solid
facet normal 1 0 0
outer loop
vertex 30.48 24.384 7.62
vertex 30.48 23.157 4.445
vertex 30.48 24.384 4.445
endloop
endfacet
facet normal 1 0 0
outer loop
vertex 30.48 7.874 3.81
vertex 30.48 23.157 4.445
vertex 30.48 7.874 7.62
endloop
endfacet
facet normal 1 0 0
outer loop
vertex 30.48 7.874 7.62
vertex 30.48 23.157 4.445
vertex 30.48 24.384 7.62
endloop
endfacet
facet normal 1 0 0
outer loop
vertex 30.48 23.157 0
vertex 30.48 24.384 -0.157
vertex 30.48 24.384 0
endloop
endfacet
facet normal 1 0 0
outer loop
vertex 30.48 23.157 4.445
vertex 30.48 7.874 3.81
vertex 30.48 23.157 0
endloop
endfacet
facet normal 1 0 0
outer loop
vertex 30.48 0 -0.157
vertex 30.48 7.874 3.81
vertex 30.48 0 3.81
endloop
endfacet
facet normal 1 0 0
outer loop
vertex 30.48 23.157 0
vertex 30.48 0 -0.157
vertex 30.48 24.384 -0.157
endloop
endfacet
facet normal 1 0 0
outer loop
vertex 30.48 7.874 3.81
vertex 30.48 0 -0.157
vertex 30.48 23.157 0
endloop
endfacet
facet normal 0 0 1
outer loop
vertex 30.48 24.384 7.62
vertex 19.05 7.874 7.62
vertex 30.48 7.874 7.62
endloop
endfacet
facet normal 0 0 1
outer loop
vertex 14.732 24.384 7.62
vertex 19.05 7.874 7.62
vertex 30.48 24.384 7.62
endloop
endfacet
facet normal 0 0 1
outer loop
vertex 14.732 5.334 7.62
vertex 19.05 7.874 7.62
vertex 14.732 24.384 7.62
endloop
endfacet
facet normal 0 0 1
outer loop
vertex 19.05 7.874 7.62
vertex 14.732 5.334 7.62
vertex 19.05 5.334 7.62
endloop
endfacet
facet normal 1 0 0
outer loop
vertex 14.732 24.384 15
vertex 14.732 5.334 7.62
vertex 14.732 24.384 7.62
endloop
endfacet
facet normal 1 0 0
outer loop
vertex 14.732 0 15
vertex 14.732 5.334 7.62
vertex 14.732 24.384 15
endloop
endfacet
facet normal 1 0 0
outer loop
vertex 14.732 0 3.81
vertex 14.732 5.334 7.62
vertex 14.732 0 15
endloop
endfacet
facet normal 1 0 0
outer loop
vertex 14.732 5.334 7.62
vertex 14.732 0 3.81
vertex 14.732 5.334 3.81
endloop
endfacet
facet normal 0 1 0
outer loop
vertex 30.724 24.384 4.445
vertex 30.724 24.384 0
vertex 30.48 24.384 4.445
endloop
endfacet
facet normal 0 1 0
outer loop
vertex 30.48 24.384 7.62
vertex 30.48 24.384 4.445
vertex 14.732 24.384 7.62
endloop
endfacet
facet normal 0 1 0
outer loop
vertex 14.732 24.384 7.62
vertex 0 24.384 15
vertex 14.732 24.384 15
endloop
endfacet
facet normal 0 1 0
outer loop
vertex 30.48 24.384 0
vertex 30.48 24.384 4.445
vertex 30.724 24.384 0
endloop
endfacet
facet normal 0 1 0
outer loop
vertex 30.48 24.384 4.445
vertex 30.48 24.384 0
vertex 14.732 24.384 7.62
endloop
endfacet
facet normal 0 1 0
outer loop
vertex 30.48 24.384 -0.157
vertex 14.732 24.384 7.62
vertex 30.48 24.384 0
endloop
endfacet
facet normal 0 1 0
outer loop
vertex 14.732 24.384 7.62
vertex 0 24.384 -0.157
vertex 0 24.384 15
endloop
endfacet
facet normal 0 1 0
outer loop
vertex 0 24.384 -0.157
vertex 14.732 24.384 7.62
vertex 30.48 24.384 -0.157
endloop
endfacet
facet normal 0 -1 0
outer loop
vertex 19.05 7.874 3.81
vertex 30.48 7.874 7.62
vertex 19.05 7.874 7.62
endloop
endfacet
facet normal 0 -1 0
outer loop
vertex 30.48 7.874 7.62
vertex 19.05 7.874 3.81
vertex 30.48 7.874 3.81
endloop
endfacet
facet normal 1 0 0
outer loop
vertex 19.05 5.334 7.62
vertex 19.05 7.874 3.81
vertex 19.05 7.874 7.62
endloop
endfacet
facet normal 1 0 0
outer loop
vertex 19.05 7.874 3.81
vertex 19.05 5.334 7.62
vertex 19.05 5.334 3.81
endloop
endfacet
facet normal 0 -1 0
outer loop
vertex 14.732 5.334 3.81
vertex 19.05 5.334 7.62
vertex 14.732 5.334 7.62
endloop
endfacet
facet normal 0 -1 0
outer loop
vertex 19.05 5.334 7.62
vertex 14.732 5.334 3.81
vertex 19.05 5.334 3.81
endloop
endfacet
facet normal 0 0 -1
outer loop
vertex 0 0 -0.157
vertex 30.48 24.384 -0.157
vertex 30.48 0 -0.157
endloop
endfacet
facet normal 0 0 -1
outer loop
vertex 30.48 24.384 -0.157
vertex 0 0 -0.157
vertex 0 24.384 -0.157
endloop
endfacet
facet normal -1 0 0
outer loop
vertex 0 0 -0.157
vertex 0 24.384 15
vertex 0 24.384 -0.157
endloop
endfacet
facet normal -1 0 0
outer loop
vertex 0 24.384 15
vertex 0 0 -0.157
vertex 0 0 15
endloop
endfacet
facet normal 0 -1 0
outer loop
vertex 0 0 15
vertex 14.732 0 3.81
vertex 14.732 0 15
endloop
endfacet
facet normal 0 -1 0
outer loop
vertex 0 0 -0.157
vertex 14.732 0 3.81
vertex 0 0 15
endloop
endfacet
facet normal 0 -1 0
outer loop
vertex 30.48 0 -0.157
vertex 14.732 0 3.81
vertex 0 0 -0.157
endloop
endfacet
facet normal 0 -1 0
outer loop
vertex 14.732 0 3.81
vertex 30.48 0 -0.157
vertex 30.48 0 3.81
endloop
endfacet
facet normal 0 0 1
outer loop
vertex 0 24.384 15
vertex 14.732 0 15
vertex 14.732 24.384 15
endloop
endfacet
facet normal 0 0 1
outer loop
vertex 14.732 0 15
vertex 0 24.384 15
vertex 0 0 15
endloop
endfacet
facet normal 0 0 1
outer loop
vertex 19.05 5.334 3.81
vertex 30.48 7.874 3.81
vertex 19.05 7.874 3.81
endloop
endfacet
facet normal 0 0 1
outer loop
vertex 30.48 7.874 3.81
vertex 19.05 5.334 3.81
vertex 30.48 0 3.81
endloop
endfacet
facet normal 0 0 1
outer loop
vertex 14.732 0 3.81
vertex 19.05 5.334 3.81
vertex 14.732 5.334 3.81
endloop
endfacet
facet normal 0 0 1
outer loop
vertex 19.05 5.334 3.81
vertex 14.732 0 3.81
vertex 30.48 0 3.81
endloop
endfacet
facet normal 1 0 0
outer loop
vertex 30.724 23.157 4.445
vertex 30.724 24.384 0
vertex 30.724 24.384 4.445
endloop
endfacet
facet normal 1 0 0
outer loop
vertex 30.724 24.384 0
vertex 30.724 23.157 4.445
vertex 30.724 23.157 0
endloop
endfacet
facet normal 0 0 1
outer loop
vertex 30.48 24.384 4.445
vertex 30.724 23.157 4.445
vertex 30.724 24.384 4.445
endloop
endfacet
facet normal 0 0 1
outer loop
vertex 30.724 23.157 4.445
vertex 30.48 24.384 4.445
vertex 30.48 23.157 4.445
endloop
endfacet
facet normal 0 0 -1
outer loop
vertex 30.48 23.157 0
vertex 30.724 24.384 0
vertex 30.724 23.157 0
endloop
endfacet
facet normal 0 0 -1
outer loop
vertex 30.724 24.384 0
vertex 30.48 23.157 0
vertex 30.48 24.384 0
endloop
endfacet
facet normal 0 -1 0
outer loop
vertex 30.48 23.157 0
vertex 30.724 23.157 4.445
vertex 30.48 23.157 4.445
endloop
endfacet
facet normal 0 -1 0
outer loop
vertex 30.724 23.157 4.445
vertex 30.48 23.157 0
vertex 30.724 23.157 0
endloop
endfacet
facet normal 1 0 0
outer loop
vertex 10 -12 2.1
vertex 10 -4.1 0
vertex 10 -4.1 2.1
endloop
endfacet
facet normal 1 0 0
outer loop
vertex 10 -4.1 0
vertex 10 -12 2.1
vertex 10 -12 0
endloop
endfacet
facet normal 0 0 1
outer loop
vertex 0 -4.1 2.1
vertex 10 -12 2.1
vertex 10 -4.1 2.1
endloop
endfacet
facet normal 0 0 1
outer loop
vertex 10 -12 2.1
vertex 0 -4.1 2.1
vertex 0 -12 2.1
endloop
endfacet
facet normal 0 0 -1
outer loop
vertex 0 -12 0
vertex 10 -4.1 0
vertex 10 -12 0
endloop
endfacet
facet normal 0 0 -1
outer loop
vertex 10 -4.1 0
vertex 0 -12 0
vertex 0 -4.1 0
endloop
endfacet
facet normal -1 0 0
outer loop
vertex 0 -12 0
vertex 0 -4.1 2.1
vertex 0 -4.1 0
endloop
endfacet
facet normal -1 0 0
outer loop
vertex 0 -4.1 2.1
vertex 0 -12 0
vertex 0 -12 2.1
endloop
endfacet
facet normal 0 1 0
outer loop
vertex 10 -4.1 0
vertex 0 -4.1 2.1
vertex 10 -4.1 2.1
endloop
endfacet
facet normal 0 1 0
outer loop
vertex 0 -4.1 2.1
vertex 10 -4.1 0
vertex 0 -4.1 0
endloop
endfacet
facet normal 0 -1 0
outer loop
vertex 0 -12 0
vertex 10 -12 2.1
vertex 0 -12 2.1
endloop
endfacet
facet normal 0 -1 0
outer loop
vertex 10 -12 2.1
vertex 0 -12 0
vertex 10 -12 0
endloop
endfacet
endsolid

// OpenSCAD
// file: atx_compliance.scad
atx_board_depth = 0.157;
atx_board_height = 24.384;
atx_board_length = 30.48;

module ATXSpecification()
{
IO_aperature_length = 6.250 * 2.54;
IO_aperature_height = .483 * 2.54;
IO_aperature_depth = 1.750 * 2.54;

// Area A
area_A_length = 30.48-14.732;
area_A_height = 16.51;
area_A_depth = 7.62;

area_A2_length = 19.05-14.732;
area_A2_height = 19.05;
area_A2_depth = 7.62;

// Area B (Card Slot Area)
// PCIe/GPU
area_B_length = 14.732;
area_B_height = 24.384;
area_B_depth = 15.0;
// area_B_depth = 1.524;

// Area C
area_C_length = 30.48-14.732; // 7.5 cm (75 mm)
area_C_height = 24.384-16.51; // 190.5 mm converted to cm
area_C_depth = 3.81;

// ATX board with color and transparency
color([0.8, 0.8, 0.8, 0.5]) // Light gray, 50% transparent
translate([0, 0, -atx_board_depth])
cube([atx_board_length, atx_board_height, atx_board_depth]);

// Area B (main card slot) with color and transparency
color([1, 0, 0, 0.5]) // Red, 50% transparent
translate([0, 0, 0])
cube([area_B_length, area_B_height, area_B_depth]);

// Area A with color and transparency
color([0, 1, 0, 0.5]) // Green, 50% transparent
union()
{
translate([area_B_length, (atx_board_height - area_A_height), 0])
cube([area_A_length, area_A_height, area_A_depth]);
translate([area_B_length, (atx_board_height - area_A2_height), 0])
cube([area_A2_length, area_A2_height, area_A2_depth]);
}

// Area C with color and transparency
color([0, 0, 1, 0.5]) // Blue, 50% transparent
translate([area_B_length, 0, 0])
cube([area_C_length, area_C_height, area_C_depth]);

translate([(5.196 + 0.65) * 2.54, atx_board_height-IO_aperature_height, 0])
cube([IO_aperature_length, IO_aperature_height, IO_aperature_depth]);

}

module ATXPowerPassthrough()
{
    $fn = 128;
    // This one overlaps the board a bit because it's near the edge
    translate([atx_board_length+1+0.5, atx_board_height-5, 4]) rotate([0, 180, 0]) cylinder(10, 1.75, 1.75); // E ATX 12V x2 (CPU power)
    
    // E ATX PWR (needs to be 5 cm min for the 12 pin)
    translate([3+16, -2-0.5, 4]) rotate([0, 180, 0])
    hull()
    {
        cylinder(10, 1.5, 1.5); 
        translate([3, 0, 0]) cylinder(10, 1.5, 1.5);
    }
    
    // GPU PWR
    gpu_pwr_rad = 1.25;
    translate([-gpu_pwr_rad-0.5, gpu_pwr_rad+0.5, 4]) rotate([0, 180, 0]) hull()
    {
     cylinder(10, gpu_pwr_rad, gpu_pwr_rad);
     translate([0, 2, 0]) cylinder(10, gpu_pwr_rad, gpu_pwr_rad);
    }
}

module MMountSurface()
{
    $fn=64;
    rotate([0, 90, 0]) color([0, 0, 0, 1]) cylinder(0.8, .6, .8);
};

module MMountCave()
{
    $fn=64;
    rotate([0, 90, 0]) BrassInsert();
    rotate([0, 90, 0]) cylinder(30, (0.3+screw_clearance)/2, (0.3+screw_clearance)/2);
};

// Spacing on Long dimension
top = 0.6 * 2.54;
mid = top + 4.9 * 2.54;
bottom = top + 11.1 * 2.54;

// Short dimension
layer_zero = atx_board_height-1.016;
layer_one = layer_zero-(0.9*2.54);
layer_two = layer_zero - 6.1*2.54;
layer_three = layer_zero-8.95*2.54;

atx_support_points = 
[
    [0, layer_zero, top], 
    [0, layer_zero, top + 3.1 * 2.54], // MICRO ATX
    [0, layer_zero, mid],
    [0, layer_one, bottom],
    [0, layer_two, top],
    [0, layer_two, mid],
    [0, layer_two, bottom],
    [0, layer_three, top],
    [0, layer_three, mid],
    [0, layer_three, bottom]
];

module ATXMotherboardMountCave()
{
    for (i = [0 : len(atx_support_points) - 1])
    {
        translate(atx_support_points[i]) MMountCave();
    }
}

module ATXMotherboardMountSurface()
{
    for (i = [0 : len(atx_support_points) - 1])
    {
        translate(atx_support_points[i]) MMountSurface();
    }
}

// ATX Specification Version 2.2
module ATXMotherboardMount() {
    // Constants for distances (in mm)
    atx_board_height = 24.4 * 2.54; // Adjust this to your board height
    top = 0.6 * 2.54;
    mid = top + 4.9 * 2.54;
    bottom = top + 11.1 * 2.54;

    // Screw positions along the layers
    layers = [
        atx_board_height - 1.016,
        atx_board_height - 2.286,
        atx_board_height - 15.494,
        atx_board_height - 22.733
    ];
    positions = [top, mid, bottom];

    // Loop over layers and positions to place screws
    for (i = [0 : len(layers) - 1]) {
        for (j = [0 : len(positions) - 1]) {
            translate([0, layers[i], positions[j]])
                rotate([0, 90, 0]) cylinder(30, (0.3+screw_clearance)/2, (0.3+screw_clearance)/2);
        }
    }
}

// IO shield overhang/GPU support slit
module AtxSupportSlit()
{
    io_shield_length = 6.25*2.4;
    gap = 0.0;
    // We don't include the IO slot because it should fit within the standoffs
    //translate([atx_board_length-io_shield_length, atx_board_height, -2.5]) cube([io_shield_length, 0.3, 5.0]);
    translate([0, atx_board_height, -2.5]) cube([atx_board_length-gap-io_shield_length, 0.3, 5.0]);
    //translate([0, atx_board_height, -2.5]) cube([atx_board_length, 0.3, 5.0]);
}

//ATXSpecification();
//ATXPowerPassthrough();
// main file
include <atx_compliance.scad>

// https://developer.nvidia.com/blog/develop-ai-powered-robots-smart-vision-systems-and-more-with-nvidia-jetson-orin-nano-developer-kit/

module JetsonOrinNano()
{
    cube([10, 7.9, 2.1]);
}

ATXSpecification();

translate([0, -12, 0]) 
JetsonOrinNano();
